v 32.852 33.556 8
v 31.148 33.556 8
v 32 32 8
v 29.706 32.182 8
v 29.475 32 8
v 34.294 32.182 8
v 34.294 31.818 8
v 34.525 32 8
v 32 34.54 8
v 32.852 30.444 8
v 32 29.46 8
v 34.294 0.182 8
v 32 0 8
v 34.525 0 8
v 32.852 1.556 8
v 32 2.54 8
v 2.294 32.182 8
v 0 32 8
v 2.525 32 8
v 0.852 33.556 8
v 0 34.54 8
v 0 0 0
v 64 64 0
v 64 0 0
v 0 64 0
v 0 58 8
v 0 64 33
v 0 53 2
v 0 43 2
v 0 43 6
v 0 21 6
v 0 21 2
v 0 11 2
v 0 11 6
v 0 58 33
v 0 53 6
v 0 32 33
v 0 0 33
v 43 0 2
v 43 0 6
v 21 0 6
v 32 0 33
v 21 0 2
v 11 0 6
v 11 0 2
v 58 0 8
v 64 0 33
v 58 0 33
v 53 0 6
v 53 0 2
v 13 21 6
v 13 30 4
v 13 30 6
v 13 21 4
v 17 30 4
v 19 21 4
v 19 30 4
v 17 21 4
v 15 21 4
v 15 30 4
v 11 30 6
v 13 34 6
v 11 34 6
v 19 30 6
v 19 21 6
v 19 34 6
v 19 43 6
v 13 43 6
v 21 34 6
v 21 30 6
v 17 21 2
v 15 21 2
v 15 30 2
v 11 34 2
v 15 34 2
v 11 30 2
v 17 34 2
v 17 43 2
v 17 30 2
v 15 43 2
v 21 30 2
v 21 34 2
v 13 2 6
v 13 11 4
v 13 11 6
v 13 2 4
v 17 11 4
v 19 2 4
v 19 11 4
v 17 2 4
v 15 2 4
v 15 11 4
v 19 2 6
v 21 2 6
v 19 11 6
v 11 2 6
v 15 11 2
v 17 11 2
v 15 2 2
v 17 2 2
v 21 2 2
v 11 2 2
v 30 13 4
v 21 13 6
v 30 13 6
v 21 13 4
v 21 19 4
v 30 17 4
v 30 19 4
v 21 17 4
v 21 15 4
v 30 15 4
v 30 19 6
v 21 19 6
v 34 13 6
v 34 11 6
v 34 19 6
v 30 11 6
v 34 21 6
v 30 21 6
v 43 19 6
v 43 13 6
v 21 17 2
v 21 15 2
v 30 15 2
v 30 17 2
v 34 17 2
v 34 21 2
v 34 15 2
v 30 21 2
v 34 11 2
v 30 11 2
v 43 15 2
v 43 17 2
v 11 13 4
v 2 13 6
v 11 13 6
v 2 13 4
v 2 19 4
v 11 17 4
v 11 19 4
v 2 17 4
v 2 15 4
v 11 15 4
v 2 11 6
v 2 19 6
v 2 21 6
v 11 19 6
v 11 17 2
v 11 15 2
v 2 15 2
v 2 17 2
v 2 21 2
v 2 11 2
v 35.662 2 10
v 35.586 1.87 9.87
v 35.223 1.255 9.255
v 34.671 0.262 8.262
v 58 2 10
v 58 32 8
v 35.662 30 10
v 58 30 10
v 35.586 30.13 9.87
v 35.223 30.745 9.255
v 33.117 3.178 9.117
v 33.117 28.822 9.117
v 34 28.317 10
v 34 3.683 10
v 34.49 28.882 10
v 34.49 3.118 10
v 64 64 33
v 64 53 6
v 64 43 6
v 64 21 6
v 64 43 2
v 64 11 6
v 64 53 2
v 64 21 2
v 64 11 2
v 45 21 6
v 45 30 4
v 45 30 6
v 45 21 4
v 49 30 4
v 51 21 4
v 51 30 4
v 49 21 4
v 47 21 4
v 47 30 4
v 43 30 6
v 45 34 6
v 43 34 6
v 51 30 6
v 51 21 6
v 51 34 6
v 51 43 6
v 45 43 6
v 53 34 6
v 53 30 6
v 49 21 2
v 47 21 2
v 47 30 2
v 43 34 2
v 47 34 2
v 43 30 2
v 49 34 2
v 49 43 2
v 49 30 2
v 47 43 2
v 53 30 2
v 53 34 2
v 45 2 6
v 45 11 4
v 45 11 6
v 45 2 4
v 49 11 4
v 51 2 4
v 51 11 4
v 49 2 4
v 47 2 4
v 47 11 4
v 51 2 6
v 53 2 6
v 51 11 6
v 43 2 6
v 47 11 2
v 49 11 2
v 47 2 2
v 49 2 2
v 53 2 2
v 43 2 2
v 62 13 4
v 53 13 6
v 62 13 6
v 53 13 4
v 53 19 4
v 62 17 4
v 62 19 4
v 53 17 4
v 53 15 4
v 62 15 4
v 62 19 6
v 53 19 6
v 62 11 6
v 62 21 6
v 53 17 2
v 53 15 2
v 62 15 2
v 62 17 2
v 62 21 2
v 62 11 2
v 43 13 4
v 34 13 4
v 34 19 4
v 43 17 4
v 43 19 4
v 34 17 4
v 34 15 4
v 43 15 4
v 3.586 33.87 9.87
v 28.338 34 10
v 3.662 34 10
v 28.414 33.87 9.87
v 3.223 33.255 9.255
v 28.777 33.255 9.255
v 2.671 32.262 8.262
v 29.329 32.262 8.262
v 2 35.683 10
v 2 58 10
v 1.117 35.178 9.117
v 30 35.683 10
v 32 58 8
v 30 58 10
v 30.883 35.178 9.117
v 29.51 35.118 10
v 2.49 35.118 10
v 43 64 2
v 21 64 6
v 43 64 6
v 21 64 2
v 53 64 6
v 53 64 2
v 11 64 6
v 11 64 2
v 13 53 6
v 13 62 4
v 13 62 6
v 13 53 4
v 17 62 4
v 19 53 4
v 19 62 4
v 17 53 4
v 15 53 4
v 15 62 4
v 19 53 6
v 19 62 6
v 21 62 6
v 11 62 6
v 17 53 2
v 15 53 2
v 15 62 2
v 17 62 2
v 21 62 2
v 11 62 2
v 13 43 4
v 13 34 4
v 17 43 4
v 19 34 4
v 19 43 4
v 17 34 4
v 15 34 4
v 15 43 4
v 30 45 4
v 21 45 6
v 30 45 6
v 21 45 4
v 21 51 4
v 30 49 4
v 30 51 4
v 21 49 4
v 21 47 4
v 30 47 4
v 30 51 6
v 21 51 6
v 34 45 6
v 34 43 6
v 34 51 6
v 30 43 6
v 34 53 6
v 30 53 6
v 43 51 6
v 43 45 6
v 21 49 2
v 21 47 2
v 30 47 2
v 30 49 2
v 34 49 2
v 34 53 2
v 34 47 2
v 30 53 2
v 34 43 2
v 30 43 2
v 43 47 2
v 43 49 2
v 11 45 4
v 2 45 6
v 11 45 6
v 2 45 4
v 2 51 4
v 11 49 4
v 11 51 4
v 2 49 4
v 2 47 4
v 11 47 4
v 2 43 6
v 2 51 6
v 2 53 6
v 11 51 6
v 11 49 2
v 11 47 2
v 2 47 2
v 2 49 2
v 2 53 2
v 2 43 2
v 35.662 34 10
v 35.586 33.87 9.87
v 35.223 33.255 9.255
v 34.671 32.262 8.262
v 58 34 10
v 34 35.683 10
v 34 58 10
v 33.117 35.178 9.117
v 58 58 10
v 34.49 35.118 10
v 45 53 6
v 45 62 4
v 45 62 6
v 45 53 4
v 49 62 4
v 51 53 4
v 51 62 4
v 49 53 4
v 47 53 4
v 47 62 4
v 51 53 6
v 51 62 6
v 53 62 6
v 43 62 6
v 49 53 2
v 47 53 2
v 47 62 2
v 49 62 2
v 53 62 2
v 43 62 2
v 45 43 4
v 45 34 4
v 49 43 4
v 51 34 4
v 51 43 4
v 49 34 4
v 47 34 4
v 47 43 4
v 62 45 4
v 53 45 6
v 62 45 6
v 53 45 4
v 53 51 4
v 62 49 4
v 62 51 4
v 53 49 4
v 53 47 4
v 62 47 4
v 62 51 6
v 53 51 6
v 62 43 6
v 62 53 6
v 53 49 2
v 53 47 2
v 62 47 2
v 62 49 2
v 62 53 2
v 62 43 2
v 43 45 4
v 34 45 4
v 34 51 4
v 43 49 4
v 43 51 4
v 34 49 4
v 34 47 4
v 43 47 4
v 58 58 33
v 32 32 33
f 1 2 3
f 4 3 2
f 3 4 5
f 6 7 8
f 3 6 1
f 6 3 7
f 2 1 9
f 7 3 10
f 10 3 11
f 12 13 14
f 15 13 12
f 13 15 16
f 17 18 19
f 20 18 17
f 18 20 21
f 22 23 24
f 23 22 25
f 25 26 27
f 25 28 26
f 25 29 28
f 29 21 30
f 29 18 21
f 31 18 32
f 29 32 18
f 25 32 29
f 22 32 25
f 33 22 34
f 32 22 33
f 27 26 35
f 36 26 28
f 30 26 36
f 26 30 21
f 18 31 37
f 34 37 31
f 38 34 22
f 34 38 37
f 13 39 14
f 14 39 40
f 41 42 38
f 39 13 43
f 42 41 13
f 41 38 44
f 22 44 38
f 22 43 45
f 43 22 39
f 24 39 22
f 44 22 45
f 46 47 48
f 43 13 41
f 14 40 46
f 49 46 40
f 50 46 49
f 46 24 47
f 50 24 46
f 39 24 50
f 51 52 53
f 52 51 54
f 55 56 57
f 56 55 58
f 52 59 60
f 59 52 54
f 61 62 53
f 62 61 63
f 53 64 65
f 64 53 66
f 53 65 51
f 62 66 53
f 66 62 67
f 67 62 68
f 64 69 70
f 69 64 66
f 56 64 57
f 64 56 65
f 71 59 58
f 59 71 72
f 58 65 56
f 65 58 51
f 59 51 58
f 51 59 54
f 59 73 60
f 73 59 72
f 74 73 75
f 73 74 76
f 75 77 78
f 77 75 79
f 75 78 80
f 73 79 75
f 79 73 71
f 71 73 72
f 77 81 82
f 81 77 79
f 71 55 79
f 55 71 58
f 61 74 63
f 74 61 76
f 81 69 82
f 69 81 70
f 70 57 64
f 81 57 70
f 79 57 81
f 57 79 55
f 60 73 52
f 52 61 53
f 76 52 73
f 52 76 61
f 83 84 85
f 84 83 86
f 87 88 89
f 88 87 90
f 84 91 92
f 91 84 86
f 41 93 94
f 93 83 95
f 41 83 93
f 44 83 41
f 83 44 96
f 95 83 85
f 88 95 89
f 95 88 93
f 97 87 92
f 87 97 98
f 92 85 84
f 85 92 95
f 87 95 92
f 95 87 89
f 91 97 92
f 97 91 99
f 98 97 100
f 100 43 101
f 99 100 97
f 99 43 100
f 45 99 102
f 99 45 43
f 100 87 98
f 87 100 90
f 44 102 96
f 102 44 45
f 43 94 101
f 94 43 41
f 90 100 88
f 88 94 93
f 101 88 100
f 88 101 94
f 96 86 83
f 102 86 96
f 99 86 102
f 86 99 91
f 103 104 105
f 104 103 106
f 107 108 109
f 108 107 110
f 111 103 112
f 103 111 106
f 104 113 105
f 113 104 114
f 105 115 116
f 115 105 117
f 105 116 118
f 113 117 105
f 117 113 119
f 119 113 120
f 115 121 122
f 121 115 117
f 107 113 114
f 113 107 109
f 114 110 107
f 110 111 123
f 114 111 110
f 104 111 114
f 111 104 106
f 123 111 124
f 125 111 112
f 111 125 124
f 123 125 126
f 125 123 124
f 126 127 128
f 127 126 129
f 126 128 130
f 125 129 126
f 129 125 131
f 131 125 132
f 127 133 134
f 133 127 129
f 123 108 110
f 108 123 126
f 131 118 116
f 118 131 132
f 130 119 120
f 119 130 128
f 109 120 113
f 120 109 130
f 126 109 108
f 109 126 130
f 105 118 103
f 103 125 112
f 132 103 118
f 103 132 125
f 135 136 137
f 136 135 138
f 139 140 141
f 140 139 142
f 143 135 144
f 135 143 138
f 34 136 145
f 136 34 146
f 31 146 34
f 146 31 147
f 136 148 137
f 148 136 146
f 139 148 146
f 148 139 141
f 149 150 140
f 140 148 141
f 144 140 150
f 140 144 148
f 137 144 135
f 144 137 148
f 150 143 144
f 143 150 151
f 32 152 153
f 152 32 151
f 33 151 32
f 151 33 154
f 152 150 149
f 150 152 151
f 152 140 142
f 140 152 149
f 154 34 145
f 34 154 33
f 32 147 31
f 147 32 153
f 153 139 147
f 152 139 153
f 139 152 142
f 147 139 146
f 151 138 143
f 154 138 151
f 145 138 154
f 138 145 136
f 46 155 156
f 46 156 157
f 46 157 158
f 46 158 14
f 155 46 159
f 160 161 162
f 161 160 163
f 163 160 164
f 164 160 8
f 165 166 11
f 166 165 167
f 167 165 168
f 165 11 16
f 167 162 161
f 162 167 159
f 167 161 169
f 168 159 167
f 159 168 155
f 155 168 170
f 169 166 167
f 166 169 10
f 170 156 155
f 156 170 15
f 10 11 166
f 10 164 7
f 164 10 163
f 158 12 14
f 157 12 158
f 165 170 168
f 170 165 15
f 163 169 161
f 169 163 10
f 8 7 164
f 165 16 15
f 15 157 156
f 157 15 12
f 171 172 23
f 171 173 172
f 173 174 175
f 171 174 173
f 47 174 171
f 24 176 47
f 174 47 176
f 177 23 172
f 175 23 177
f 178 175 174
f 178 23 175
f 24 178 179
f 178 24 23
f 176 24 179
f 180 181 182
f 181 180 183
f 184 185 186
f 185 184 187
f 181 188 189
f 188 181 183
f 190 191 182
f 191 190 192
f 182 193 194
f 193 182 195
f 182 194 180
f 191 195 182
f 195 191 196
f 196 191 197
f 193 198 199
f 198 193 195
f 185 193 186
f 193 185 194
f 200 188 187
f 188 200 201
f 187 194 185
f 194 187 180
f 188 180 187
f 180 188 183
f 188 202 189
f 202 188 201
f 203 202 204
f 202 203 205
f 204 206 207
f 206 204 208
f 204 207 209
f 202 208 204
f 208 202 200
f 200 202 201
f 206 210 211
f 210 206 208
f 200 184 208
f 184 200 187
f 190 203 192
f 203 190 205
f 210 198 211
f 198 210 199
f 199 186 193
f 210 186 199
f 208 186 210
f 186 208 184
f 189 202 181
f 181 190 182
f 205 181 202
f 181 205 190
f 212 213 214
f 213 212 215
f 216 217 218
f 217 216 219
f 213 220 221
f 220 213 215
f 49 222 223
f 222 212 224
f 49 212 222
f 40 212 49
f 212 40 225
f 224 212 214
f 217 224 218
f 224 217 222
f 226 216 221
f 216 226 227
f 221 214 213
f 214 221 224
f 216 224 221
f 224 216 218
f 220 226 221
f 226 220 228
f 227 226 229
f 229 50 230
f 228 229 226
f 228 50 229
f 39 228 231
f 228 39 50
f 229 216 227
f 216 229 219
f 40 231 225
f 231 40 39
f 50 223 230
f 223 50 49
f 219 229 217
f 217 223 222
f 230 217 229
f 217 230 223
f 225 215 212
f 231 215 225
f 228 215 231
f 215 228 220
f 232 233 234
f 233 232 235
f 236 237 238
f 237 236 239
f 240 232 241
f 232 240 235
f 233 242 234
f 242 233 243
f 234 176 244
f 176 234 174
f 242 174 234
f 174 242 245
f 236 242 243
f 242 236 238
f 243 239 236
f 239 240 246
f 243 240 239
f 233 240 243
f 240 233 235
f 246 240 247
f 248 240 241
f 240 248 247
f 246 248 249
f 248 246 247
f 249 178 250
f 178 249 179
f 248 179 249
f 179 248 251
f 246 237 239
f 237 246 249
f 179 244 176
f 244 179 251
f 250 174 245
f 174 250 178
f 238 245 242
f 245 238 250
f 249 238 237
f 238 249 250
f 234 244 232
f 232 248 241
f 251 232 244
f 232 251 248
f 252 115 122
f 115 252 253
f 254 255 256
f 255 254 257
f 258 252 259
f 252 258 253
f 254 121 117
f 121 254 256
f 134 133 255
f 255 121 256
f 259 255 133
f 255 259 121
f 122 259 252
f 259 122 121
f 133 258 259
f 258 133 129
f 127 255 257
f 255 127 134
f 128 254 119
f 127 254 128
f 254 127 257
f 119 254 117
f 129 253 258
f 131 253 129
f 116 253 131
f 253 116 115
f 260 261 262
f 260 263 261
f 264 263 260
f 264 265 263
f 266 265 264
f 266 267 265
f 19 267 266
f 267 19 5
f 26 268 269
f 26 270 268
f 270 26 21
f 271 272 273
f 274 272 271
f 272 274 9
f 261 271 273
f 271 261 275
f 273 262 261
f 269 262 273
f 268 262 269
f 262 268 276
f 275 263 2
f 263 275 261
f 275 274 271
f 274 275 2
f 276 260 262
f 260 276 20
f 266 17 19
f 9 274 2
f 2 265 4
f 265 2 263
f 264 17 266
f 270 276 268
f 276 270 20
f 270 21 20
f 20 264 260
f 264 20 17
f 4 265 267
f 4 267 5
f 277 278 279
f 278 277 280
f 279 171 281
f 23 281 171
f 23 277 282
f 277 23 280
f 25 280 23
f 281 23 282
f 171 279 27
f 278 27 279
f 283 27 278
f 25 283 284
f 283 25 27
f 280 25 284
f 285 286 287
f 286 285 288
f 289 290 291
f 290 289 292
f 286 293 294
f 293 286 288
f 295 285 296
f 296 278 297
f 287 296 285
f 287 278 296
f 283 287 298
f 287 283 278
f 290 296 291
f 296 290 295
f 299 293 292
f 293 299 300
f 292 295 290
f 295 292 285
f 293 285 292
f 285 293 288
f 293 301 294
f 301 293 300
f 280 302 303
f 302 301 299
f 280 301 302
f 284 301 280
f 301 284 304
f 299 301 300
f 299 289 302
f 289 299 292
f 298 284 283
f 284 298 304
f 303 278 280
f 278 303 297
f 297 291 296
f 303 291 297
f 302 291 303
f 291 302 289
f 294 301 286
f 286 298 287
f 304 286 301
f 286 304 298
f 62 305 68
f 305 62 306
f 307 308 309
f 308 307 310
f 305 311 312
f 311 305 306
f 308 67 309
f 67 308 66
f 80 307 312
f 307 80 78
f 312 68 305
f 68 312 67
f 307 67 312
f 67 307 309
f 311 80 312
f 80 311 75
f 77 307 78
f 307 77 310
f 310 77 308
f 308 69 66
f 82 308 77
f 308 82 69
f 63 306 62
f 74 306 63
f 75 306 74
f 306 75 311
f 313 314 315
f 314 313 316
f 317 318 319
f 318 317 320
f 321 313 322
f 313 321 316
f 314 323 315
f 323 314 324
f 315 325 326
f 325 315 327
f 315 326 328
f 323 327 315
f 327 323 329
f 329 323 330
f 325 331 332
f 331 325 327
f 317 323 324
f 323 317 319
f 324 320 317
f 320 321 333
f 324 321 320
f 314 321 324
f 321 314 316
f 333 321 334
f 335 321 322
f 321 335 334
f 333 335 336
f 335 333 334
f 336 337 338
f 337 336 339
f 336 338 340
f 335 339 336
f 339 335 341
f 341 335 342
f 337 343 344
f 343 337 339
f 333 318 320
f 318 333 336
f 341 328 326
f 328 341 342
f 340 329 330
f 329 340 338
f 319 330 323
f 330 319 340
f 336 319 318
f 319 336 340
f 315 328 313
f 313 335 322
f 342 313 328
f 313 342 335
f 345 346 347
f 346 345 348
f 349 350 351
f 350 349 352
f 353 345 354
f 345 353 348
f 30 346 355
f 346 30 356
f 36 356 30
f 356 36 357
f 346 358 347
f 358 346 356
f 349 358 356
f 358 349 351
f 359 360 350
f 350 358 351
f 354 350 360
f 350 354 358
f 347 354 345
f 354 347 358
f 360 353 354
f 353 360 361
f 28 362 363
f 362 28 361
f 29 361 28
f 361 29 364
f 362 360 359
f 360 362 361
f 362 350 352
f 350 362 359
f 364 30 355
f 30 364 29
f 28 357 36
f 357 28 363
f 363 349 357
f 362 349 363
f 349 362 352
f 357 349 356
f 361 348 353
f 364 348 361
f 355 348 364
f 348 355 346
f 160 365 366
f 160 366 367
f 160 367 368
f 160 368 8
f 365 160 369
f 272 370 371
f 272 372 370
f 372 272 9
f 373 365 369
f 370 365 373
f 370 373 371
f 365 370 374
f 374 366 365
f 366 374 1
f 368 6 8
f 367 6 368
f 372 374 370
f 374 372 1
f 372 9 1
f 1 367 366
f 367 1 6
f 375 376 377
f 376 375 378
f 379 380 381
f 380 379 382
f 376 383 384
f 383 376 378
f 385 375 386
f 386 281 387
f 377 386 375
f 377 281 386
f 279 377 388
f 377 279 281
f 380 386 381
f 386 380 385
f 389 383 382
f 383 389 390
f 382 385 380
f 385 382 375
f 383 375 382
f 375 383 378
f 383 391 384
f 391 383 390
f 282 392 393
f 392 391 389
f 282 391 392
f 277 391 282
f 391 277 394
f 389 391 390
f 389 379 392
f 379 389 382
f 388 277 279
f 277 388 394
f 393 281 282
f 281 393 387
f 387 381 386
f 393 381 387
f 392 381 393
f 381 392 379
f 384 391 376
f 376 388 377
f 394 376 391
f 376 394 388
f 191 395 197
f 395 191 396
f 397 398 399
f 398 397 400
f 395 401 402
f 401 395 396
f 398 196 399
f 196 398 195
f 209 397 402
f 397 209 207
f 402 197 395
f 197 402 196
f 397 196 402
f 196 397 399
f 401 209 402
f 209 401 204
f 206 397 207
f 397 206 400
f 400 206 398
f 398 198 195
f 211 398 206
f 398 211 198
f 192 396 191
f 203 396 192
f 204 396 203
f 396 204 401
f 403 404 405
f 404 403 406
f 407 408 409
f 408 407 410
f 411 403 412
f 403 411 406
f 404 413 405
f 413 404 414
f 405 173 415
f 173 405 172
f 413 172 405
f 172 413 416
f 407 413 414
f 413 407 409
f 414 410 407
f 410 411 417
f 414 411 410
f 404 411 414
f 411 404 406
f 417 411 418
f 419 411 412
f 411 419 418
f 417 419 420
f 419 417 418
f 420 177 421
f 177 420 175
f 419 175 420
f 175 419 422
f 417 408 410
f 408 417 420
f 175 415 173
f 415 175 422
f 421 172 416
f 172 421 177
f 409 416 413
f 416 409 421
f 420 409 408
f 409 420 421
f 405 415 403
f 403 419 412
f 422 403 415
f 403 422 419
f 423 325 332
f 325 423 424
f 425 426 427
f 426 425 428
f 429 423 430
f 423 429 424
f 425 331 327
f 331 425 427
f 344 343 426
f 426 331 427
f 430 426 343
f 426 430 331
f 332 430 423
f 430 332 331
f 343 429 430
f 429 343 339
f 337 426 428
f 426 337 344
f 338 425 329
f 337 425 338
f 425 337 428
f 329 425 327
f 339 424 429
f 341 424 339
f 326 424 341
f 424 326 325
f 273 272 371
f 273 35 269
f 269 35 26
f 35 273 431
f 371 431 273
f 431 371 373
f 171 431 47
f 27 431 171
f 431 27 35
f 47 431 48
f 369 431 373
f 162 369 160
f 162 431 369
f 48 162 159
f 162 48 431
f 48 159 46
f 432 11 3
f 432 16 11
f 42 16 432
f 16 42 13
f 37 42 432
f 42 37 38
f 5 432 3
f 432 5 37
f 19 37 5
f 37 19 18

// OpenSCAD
// file: ModularDungeonTileLibrary.scad
//Constants
wallleft = 0;
wallbottom = 1;
wallright = 2;
walltop = 3;
wallcenter = 4;
walldoubleright = 5;


//Variables
size = 32;
connectorlength = size-10;
connectorwidth = 6;
connectorheight = 4;
baseheight = 8;
topperheight = 2;
topperrounded = true;
walllength = size;
wallheight = 25;
wallwidth = 6;
wallwidththin = 4;


//Functions
function hypotenuse_ra(side_a, side_b) =
    sqrt(pow(side_a, 2) + pow(side_b, 2));
    
    
//Modules    
module mtdl_Base_Connector(cw,cl,ch) {
    translate([-connectorwidth/2,-connectorlength/2,-connectorheight/2]) {
        cube([cw,cl,ch/2]);
        translate([cw/3,0,ch/2])
            cube([cw/3,cl,ch/2]);
        translate([-(cw-2)/2,cl/2-2,0])
            cube([cw+4,4,ch]);
    }
}

module mdtl_Base(s,bh)
{
    cube([s,s,bh]);
}

module mdtl_Topper(s,bh,th,tr)
{
    if (tr) {
        translate([0,0,bh])
            intersection() {
                difference () {
                        cube([s,s,th]);
                        union () {
                        rotate(a=45, v=[1,0,0])
                            cube([s,th*2,th*2]);
                        translate([0,s,0])
                            rotate(a=45, v=[1,0,0])
                                cube([s,th*2,th*2]);
                        rotate(a=-45, v=[0,1,0])
                            cube([th*2,s,th*2]);
                        translate([s,0,0])
                            rotate(a=-45, v=[0,1,0])
                                cube([th*2,s,th*2]);
                        }
                }
                translate([s/2,s/2,0])
                    cylinder(
                        h=th, 
                        r1=hypotenuse_ra(s/2-1.2, s/2-1.2), 
                        r2=hypotenuse_ra(s/2-th-.8, s/2-th-.8), 
                        center=false, 
                        $fa=.1);
            }    
    }
    else {
        translate([0,0,bh])
            difference() {
                cube([s,s,th]);
                union () {
                rotate(a=45, v=[1,0,0])
                    cube([s,th*2,th*2]);
                translate([0,s,0])
                    rotate(a=45, v=[1,0,0])
                        cube([s,th*2,th*2]);
                rotate(a=-45, v=[0,1,0])
                    cube([th*2,s,th*2]);
                translate([s,0,0])
                    rotate(a=-45, v=[0,1,0])
                        cube([th*2,s,th*2]);
                }
            }    
    }
}

module mdtl_Base_1x1(s,bh,th,tr) 
{
    difference () {
        union () {
            mdtl_Base(s,bh);
            mdtl_Topper(s,bh,th,tr);
        }
        union () {
            translate([size/2,size,baseheight/2])
                rotate([0,180,0])
                    mtdl_Base_Connector(connectorwidth,connectorlength,connectorheight);
            translate([size/2,0,baseheight/2])
                rotate([0,180,0])
                    mtdl_Base_Connector(connectorwidth,connectorlength,connectorheight);
            translate([size,size/2,baseheight/2])
                rotate([0,180,90])
                    mtdl_Base_Connector(connectorwidth,connectorlength,connectorheight);
            translate([0,size/2,baseheight/2])
                rotate([0,180,90])
                    mtdl_Base_Connector(connectorwidth,connectorlength,connectorheight);
        }
    }
}

module mdtl_Base_1x2(s,bh,th,tr)
{
    union () {
        mdtl_Base_1x1(s,bh,th,tr);
        translate([s,0,0])
            mdtl_Base_1x1(s,bh,th,tr);
    }
}
 
module mdtl_Base_2x2(s,bh,th,tr)
{
    union () {
        mdtl_Base_1x2(s,bh,th,tr);
        translate([0,s,0])
            mdtl_Base_1x2(s,bh,th,tr);
    }
}
 
module mdtl_Base_2x4(s,bh,th,tr)
{
    union () {
        mdtl_Base_2x2(s,bh,th,tr);
        translate([s*2,0,0])
            mdtl_Base_2x2(s,bh,th,tr);
    }
}
 
module mdtl_Base_4x4(s,bh,th,tr)
{
    union () {
        mdtl_Base_2x4(s,bh,th,tr);
        translate([0,s*2,0])
            mdtl_Base_2x4(s,bh,th,tr);
    }
}
 
module mdtl_Wall_1(w,l,h)
{
    translate([0,0,baseheight])
        cube([w,l,h]);   
}

module mdtl_Wall_1_Position(w,l,h,p)
{
    if (p==0) {
        mdtl_Wall_1(w,l,h);
    }
    
    else if (p==1) {
        rotate(a=-90)
           translate([-w,0,0])
               mdtl_Wall_1(w,l,h);       
    }
    
    else if (p==2) {
        translate([(size)-w,0,0])
            mdtl_Wall_1(w,l,h);
    }
    
    else if (p==3) {
        rotate(a=-90)
            translate([-l,0,0])
                mdtl_Wall_1(w,l,h);
    }
    
    else if (p==4) {
        translate([(size)-w/2,0,0])
            mdtl_Wall_1(w,l,h);
    }
    
    else if (p==5) {
        translate([(size*2)-w,0,0])
           mdtl_Wall_1(w,l,h);       
    }
}

module mdtl_Wall_2(w,l,h)
{
    union() {
        mdtl_Wall_1(w,l,h);
        translate([0,l,0])
            mdtl_Wall_1(w,l,h);
    }
}

module mdtl_Wall_2_Position(w,l,h,p)
{
    if (p==0) {
        mdtl_Wall_2(w,l,h);
    }
    
    else if (p==1) {
        rotate(a=-90)
            translate([-w,0,0])
                mdtl_Wall_2(w,l,h);
    }
    
    else if (p==2) {
    translate([(size*2)-w,0,0])
        mdtl_Wall_2(w,l,h);
    }
    
    else if (p==3) {
        rotate(a=-90)
            translate([-l*2,0,0])
                mdtl_Wall_2(w,l,h);
    }
    
    else if (p==4) {
        translate([(size)-w/2,0,0])
            mdtl_Wall_2(w,l,h);
    }
}
// main file
include <ModularDungeonTileLibrary.scad>; 

mdtl_Base_2x2(size,baseheight,topperheight,topperrounded);
mdtl_Wall_2_Position(wallwidth,walllength,wallheight,walltop);
mdtl_Wall_2_Position(wallwidth,walllength,wallheight,wallright);
//Create Pillar with Modified wall
mdtl_Wall_1_Position(size,size,wallheight,wallleft);
